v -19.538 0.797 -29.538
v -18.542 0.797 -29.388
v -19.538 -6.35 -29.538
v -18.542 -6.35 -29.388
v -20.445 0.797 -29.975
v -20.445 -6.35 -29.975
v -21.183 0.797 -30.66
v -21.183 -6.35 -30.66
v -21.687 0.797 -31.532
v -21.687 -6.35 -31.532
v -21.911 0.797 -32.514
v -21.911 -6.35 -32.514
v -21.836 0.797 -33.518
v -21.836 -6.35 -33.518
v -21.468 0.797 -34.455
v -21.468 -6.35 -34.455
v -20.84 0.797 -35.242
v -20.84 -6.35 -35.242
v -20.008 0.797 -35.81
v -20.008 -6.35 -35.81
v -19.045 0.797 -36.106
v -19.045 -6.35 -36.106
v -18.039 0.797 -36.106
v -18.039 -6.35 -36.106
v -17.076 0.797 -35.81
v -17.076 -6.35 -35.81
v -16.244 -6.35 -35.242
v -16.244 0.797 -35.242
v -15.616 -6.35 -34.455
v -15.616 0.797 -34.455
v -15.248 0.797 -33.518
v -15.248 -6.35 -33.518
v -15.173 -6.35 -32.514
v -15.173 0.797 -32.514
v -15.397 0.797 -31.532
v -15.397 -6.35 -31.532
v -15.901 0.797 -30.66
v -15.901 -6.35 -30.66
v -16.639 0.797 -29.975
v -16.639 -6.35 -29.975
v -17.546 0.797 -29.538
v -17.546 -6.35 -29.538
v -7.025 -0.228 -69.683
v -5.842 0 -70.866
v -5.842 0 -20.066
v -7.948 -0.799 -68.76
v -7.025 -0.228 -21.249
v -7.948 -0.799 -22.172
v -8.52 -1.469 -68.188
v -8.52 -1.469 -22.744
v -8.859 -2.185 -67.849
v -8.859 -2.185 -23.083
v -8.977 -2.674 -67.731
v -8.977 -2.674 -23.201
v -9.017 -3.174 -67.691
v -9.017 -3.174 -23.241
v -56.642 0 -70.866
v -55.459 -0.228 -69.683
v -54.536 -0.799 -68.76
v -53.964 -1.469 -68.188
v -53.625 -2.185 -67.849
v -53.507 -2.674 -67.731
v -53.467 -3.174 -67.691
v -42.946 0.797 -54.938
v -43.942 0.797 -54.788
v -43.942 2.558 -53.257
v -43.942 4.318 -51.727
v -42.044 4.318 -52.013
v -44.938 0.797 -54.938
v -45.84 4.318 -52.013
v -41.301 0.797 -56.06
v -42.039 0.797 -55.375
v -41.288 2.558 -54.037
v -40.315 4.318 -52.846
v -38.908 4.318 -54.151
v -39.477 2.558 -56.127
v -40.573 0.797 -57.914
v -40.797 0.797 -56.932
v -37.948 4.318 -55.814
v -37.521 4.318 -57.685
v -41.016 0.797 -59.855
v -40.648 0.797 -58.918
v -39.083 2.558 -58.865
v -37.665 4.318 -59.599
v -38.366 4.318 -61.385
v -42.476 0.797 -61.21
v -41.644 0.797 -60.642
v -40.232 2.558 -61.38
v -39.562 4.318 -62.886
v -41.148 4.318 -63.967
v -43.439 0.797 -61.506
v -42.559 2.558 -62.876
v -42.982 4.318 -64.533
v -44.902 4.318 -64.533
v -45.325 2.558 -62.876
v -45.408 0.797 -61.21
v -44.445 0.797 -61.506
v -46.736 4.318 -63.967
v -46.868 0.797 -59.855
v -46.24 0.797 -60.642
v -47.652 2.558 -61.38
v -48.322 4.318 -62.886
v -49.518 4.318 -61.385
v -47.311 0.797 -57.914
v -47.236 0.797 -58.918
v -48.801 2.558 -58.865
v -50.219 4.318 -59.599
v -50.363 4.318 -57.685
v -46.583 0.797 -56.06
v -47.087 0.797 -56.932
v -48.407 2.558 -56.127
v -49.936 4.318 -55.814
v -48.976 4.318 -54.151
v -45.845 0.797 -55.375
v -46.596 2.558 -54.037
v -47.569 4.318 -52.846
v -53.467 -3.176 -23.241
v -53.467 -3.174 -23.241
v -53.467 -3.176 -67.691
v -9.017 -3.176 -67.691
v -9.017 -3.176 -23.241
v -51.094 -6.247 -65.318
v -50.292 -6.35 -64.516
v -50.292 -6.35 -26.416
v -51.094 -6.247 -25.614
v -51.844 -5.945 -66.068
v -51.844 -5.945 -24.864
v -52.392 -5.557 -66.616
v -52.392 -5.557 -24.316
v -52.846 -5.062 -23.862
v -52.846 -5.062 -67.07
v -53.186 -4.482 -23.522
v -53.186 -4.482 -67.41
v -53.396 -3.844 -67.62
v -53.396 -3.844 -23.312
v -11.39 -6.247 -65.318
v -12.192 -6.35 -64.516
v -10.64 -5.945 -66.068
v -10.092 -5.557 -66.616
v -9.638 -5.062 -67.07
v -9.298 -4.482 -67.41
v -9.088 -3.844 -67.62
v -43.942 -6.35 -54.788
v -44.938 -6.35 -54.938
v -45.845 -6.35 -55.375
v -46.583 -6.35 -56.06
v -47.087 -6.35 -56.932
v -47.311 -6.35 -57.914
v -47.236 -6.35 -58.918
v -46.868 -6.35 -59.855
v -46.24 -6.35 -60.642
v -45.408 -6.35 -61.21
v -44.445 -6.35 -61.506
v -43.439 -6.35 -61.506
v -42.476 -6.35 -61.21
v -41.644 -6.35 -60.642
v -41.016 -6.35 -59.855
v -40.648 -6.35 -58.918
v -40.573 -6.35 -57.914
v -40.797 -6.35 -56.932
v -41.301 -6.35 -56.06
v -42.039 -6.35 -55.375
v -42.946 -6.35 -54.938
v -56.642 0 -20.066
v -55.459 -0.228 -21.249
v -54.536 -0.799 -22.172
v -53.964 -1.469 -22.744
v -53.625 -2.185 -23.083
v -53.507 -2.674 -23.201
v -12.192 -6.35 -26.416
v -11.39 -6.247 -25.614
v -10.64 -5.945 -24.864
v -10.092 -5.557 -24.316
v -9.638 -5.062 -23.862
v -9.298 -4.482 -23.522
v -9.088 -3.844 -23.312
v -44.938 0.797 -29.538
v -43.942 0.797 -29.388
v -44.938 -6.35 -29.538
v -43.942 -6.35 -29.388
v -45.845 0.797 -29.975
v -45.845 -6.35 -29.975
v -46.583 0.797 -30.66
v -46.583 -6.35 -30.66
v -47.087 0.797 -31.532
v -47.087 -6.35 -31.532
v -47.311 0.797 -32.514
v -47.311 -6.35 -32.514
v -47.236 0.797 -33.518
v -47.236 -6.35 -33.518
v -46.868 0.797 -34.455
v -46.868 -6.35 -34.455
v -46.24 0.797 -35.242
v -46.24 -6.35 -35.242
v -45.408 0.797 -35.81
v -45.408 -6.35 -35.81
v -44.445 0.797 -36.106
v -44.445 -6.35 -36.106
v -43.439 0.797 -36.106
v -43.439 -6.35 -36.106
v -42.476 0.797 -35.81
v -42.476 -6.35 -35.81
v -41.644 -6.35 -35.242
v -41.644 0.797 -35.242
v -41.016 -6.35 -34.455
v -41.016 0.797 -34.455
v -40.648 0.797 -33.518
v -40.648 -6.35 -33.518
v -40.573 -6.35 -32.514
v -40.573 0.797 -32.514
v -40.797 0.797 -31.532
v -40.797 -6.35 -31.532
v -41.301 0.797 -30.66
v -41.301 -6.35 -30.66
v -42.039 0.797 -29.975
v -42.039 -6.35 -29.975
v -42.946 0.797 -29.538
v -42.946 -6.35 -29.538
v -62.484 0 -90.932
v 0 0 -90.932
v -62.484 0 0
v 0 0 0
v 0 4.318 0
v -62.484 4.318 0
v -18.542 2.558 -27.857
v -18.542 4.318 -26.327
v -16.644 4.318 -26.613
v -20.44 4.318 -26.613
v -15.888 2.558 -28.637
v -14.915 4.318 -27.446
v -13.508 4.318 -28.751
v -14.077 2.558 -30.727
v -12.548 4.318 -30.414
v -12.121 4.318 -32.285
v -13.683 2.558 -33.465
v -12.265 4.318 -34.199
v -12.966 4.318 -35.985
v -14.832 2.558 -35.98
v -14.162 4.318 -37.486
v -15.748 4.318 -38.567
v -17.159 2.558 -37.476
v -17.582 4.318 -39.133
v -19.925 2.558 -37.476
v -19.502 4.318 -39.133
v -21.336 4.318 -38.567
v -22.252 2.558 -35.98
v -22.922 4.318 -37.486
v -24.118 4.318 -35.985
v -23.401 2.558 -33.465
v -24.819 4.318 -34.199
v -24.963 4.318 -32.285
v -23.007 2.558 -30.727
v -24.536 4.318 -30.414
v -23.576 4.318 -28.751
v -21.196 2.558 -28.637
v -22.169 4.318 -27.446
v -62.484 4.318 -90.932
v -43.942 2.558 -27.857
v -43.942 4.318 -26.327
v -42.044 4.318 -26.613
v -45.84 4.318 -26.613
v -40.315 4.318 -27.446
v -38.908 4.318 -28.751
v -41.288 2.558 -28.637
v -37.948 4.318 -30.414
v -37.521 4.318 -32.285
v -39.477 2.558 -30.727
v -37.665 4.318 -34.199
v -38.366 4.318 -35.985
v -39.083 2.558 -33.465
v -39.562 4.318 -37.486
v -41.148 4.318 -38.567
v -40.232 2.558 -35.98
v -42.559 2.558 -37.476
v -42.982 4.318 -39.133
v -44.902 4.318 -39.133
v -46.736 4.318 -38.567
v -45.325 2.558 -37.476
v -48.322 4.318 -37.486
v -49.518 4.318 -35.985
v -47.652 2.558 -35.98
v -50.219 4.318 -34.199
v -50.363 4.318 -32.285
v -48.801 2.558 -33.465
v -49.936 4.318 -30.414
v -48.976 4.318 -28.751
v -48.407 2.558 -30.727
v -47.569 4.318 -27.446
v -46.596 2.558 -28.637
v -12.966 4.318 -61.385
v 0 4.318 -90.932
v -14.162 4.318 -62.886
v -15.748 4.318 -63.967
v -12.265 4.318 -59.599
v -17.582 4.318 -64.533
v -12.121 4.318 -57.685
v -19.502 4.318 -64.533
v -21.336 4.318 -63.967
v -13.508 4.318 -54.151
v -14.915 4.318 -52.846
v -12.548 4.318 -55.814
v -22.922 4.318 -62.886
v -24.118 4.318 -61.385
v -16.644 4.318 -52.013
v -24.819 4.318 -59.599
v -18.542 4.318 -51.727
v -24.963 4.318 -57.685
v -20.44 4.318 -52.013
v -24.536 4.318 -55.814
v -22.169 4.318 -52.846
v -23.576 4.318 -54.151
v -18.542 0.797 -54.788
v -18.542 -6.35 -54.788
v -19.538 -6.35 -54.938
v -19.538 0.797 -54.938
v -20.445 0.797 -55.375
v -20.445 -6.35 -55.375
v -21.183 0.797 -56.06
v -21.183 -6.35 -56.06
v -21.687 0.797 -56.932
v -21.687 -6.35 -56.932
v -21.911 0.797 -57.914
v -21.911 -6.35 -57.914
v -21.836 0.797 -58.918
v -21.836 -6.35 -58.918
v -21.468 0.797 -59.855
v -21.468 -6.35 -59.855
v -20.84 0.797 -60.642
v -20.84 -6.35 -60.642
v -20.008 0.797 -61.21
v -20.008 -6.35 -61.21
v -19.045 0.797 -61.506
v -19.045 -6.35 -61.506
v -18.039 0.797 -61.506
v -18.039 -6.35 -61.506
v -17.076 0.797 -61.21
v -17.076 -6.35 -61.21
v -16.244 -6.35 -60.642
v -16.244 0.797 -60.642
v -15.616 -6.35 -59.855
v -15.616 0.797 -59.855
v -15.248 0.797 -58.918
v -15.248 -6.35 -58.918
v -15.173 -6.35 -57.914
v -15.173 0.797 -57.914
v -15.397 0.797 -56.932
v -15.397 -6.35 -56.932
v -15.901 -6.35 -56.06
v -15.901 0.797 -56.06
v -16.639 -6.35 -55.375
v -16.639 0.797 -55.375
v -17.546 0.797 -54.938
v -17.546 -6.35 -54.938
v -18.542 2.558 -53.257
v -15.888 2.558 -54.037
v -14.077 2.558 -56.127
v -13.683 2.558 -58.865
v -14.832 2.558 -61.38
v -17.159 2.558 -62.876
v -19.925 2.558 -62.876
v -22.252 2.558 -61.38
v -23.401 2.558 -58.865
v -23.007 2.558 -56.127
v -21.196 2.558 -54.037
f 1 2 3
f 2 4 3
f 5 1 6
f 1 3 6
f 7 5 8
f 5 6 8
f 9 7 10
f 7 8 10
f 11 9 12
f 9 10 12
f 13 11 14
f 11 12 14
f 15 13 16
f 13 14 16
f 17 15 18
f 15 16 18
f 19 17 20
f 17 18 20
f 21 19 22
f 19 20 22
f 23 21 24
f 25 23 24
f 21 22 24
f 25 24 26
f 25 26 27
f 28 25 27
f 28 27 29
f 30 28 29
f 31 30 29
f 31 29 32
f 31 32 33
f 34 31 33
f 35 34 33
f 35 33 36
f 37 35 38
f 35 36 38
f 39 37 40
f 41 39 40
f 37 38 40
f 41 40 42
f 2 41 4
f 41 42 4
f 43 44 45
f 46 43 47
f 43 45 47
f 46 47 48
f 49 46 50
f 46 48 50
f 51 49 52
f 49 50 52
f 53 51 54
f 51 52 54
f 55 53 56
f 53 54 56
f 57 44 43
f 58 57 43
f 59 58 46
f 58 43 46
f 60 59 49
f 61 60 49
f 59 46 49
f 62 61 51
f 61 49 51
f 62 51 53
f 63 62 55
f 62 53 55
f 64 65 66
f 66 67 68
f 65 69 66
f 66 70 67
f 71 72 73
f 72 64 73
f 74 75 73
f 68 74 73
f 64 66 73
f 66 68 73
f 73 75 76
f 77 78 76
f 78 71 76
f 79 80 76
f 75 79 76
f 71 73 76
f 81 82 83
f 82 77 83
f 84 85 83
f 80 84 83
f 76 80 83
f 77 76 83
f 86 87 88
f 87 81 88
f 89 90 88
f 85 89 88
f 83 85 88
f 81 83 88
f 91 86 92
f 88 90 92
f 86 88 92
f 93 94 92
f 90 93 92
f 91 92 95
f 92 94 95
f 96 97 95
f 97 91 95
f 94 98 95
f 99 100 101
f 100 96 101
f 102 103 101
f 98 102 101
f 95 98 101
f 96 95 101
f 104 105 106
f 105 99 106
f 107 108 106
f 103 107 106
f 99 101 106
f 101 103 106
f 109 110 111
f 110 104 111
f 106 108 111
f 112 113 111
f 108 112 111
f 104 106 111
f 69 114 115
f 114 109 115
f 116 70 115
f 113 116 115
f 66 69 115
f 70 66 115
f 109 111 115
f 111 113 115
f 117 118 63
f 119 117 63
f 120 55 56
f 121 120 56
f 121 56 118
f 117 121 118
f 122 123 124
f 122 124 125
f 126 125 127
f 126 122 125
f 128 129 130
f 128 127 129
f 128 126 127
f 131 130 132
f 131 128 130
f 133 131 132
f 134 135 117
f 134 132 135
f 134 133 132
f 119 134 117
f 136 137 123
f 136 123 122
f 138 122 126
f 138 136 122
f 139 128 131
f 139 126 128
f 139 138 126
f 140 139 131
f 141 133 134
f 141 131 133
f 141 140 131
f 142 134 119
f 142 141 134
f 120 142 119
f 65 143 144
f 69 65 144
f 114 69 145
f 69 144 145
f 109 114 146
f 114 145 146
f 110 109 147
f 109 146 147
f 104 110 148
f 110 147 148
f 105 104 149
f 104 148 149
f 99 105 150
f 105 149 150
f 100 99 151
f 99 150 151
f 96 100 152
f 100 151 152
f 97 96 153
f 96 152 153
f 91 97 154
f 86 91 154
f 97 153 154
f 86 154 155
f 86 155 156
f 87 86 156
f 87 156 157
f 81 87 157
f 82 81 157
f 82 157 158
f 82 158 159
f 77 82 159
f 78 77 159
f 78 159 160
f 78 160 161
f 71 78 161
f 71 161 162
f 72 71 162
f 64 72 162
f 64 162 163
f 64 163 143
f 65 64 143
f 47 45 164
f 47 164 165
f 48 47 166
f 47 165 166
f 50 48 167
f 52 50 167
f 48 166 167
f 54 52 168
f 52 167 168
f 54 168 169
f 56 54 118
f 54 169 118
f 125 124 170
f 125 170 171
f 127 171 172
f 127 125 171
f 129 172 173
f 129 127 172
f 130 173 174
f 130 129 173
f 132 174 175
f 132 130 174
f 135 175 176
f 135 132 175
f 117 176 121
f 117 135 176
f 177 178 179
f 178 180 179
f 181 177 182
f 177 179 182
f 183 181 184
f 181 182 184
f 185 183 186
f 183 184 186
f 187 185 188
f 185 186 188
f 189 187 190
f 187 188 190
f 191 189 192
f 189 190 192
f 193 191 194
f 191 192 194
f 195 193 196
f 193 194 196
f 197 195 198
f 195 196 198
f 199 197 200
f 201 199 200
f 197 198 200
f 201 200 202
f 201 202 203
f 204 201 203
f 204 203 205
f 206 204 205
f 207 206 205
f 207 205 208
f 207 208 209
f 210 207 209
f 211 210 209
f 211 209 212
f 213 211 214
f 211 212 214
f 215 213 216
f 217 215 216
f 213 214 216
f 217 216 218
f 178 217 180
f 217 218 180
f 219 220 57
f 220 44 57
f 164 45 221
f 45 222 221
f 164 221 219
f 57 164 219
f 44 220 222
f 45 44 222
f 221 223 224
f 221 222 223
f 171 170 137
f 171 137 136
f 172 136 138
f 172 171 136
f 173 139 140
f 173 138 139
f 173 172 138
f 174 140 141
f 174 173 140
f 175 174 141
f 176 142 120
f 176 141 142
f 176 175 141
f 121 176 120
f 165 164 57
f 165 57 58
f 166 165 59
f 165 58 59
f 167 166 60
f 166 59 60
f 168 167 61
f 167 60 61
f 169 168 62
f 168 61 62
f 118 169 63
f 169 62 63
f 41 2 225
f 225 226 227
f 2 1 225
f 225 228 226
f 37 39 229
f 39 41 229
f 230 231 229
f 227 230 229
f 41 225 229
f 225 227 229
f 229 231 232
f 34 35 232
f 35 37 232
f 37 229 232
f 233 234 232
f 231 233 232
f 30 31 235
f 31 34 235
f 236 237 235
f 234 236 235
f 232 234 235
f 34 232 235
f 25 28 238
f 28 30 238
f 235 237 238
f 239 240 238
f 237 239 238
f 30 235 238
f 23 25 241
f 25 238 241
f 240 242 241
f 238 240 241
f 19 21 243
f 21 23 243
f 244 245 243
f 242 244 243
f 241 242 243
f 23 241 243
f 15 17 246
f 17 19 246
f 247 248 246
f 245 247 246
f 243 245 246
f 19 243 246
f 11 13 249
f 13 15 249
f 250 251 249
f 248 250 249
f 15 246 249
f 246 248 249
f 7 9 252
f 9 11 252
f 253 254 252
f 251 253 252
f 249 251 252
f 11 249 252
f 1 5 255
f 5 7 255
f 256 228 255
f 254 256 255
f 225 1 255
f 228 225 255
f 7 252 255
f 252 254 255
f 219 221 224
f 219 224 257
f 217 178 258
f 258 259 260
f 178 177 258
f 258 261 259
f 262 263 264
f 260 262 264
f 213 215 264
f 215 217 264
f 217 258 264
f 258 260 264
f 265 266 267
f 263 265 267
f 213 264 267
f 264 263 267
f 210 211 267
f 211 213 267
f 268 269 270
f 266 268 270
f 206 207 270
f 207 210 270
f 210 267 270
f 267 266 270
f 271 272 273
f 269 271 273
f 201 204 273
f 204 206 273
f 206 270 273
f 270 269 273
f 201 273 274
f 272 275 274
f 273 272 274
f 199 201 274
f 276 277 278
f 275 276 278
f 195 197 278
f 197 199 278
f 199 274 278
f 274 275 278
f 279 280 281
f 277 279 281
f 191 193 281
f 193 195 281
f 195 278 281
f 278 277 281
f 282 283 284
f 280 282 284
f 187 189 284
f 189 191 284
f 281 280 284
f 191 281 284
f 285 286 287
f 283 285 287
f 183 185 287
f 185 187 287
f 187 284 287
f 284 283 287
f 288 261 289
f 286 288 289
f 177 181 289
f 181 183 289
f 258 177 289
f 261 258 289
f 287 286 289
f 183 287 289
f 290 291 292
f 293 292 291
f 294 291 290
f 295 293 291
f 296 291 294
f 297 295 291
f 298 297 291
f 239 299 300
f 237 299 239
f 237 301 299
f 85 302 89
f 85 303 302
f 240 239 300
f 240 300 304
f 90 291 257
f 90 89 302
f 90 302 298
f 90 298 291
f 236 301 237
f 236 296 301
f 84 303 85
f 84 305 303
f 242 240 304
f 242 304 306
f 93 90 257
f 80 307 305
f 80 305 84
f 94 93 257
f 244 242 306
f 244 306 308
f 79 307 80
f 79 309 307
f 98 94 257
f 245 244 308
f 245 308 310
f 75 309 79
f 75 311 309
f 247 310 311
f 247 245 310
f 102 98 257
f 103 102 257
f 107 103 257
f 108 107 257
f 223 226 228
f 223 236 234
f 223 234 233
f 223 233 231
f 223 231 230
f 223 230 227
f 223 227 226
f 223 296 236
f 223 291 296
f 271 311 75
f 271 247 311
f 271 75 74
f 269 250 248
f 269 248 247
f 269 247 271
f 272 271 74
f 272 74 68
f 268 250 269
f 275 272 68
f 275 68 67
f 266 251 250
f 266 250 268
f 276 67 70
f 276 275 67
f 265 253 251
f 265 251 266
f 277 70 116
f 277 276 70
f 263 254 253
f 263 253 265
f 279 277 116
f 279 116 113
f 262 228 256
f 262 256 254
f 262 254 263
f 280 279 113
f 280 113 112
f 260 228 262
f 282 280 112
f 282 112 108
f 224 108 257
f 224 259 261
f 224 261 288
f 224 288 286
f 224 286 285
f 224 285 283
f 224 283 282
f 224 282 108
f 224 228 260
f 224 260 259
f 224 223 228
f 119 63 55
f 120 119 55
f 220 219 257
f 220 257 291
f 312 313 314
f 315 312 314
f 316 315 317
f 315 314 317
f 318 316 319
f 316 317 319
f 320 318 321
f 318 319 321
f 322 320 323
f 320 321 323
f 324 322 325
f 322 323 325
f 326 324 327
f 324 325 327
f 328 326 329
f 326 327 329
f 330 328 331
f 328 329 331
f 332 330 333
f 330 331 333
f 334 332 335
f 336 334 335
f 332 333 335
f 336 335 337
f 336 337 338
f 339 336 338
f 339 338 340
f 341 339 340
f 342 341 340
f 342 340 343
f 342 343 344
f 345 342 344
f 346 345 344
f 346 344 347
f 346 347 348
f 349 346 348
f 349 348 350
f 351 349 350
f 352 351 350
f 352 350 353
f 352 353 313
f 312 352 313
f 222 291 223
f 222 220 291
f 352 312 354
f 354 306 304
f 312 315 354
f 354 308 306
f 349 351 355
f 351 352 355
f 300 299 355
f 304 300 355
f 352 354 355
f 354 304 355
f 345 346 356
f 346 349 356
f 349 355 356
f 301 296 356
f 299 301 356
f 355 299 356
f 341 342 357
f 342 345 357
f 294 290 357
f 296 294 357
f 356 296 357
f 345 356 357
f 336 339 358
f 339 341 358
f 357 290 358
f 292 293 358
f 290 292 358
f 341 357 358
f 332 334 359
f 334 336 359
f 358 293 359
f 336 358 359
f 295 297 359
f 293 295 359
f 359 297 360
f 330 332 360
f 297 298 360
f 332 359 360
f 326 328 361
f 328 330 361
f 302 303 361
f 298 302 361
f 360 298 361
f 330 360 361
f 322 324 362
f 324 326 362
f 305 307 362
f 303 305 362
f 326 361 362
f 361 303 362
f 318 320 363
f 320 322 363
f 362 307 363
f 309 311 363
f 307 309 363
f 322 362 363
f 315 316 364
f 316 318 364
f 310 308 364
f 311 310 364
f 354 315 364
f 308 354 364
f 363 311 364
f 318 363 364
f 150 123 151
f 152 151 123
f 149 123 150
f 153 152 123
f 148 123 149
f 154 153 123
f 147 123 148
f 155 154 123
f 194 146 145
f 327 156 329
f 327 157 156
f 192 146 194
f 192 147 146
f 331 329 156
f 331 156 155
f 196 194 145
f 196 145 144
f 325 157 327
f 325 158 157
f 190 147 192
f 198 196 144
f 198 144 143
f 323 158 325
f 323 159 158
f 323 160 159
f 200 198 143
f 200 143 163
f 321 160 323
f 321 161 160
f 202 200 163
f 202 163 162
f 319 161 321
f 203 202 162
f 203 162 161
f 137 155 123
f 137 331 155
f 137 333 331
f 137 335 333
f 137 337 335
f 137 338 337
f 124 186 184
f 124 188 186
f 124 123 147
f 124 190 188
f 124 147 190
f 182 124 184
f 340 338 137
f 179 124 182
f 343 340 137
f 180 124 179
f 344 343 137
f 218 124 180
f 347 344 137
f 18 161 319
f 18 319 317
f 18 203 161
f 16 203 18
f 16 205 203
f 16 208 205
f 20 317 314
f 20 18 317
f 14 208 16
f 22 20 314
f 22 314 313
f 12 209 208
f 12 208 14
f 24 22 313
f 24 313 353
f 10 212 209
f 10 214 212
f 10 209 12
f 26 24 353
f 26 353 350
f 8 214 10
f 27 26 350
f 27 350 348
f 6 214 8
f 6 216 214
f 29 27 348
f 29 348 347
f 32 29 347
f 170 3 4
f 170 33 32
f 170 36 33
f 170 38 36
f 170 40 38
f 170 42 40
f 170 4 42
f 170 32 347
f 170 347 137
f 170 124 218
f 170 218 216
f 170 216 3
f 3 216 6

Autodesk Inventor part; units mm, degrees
ref_plane "YZ Plane" through (0, 0, 0) normal (1, 0, 0) x (0, 1, 0)
ref_plane "XZ Plane" through (0, 0, 0) normal (0, 1, 0) x (-1, 0, 0)
ref_plane "XY Plane" through (0, 0, 0) normal (0, 0, 1) x (1, 0, 0)
sketch "Sketch1" plane through (0, 0, 0) normal (0, 1, 0) x (-1, 0, 0)
  line L0 (0, 0) -> (62.484, 0)
  line L1 (62.484, 0) -> (62.484, -90.932)
  line L2 (62.484, -90.932) -> (0, -90.932)
  line L3 (0, -90.932) -> (0, 0)
  dimension "d0" = 62.484
  dimension "d1" = 90.932
extrude "Extrusion1" add sketch "Sketch1" along normal blind 4.318
sketch "Sketch3" plane through (0, 0, 0) normal (0, -1, 0) x (1, 0, 0)
  line L0 (0, 0) -> (0, -90.932) projected
  line L1 (-62.484, -90.932) -> (-62.484, 0) projected
  line L2 (-62.484, 0) -> (0, 0) projected
  line L3 (0, -90.932) -> (-62.484, -90.932) projected
  line L4 (-9.017, -23.241) -> (-53.467, -23.241)
  line L5 (-53.467, -23.241) -> (-53.467, -67.691)
  line L6 (-53.467, -67.691) -> (-9.017, -67.691)
  line L7 (-9.017, -67.691) -> (-9.017, -23.241)
  line L8 (-9.017, -23.241) -> (-53.467, -67.691) construction
  line L9 (-53.467, -23.241) -> (-9.017, -67.691) construction
  point P0 (-31.242, -45.466)
  dimension "d13" = 44.45
  dimension "d14" = 44.45
extrude "Extrusion2" add sketch "Sketch3" along normal blind 6.35 contours L7 L6 L5 L4
sketch "Sketch2" plane through (0, 4.318, 0) normal (0, 1, 0) x (1, 0, 0)
  line L0 (-62.484, 90.932) -> (-62.484, 0) projected
  line L1 (-62.484, 45.466) -> (0, 45.466)
  line L2 (0, 90.932) -> (-62.484, 90.932) projected
  line L3 (-31.242, 90.932) -> (-31.242, 0)
  line L4 (-62.484, 0) -> (0, 0) projected
  line L5 (-18.542, 32.766) -> (-43.942, 32.766)
  line L6 (-43.942, 32.766) -> (-43.942, 58.166)
  line L7 (-43.942, 58.166) -> (-18.542, 58.166)
  line L8 (-18.542, 58.166) -> (-18.542, 32.766)
  line L9 (-18.542, 32.766) -> (-43.942, 58.166) construction
  line L10 (-43.942, 32.766) -> (-18.542, 58.166) construction
  point P0 (-31.242, 45.466)
  dimension "d4" = 25.4
  dimension "d5" = 25.4
hole "Hole1" at (-18.542, 4.318, -32.766) at (-43.942, 4.318, -32.766) at (-18.542, 4.318, -58.166) at (-43.942, 4.318, -58.166) direction (0, -1, 0) diameter 6.7564 depth 25.4 tip angle 118 countersink diameter 12.8778 countersink angle 82 clearance for "Flat Head Machine Screw (82)" size "1/4" standard "Ansi Unified Screw Threads"
fillet "Fillet1" radius 3.175 8 edges at (-31.242, 0, -23.241) (-31.242, -6.35, -23.241) (-31.242, -6.35, -67.691) (-31.242, 0, -67.691) (-9.017, 0, -45.466) (-53.467, 0, -45.466) (-53.467, -6.35, -45.466) (-9.017, -6.35, -45.466)
properties part number "caster adapter for mobile afl"
